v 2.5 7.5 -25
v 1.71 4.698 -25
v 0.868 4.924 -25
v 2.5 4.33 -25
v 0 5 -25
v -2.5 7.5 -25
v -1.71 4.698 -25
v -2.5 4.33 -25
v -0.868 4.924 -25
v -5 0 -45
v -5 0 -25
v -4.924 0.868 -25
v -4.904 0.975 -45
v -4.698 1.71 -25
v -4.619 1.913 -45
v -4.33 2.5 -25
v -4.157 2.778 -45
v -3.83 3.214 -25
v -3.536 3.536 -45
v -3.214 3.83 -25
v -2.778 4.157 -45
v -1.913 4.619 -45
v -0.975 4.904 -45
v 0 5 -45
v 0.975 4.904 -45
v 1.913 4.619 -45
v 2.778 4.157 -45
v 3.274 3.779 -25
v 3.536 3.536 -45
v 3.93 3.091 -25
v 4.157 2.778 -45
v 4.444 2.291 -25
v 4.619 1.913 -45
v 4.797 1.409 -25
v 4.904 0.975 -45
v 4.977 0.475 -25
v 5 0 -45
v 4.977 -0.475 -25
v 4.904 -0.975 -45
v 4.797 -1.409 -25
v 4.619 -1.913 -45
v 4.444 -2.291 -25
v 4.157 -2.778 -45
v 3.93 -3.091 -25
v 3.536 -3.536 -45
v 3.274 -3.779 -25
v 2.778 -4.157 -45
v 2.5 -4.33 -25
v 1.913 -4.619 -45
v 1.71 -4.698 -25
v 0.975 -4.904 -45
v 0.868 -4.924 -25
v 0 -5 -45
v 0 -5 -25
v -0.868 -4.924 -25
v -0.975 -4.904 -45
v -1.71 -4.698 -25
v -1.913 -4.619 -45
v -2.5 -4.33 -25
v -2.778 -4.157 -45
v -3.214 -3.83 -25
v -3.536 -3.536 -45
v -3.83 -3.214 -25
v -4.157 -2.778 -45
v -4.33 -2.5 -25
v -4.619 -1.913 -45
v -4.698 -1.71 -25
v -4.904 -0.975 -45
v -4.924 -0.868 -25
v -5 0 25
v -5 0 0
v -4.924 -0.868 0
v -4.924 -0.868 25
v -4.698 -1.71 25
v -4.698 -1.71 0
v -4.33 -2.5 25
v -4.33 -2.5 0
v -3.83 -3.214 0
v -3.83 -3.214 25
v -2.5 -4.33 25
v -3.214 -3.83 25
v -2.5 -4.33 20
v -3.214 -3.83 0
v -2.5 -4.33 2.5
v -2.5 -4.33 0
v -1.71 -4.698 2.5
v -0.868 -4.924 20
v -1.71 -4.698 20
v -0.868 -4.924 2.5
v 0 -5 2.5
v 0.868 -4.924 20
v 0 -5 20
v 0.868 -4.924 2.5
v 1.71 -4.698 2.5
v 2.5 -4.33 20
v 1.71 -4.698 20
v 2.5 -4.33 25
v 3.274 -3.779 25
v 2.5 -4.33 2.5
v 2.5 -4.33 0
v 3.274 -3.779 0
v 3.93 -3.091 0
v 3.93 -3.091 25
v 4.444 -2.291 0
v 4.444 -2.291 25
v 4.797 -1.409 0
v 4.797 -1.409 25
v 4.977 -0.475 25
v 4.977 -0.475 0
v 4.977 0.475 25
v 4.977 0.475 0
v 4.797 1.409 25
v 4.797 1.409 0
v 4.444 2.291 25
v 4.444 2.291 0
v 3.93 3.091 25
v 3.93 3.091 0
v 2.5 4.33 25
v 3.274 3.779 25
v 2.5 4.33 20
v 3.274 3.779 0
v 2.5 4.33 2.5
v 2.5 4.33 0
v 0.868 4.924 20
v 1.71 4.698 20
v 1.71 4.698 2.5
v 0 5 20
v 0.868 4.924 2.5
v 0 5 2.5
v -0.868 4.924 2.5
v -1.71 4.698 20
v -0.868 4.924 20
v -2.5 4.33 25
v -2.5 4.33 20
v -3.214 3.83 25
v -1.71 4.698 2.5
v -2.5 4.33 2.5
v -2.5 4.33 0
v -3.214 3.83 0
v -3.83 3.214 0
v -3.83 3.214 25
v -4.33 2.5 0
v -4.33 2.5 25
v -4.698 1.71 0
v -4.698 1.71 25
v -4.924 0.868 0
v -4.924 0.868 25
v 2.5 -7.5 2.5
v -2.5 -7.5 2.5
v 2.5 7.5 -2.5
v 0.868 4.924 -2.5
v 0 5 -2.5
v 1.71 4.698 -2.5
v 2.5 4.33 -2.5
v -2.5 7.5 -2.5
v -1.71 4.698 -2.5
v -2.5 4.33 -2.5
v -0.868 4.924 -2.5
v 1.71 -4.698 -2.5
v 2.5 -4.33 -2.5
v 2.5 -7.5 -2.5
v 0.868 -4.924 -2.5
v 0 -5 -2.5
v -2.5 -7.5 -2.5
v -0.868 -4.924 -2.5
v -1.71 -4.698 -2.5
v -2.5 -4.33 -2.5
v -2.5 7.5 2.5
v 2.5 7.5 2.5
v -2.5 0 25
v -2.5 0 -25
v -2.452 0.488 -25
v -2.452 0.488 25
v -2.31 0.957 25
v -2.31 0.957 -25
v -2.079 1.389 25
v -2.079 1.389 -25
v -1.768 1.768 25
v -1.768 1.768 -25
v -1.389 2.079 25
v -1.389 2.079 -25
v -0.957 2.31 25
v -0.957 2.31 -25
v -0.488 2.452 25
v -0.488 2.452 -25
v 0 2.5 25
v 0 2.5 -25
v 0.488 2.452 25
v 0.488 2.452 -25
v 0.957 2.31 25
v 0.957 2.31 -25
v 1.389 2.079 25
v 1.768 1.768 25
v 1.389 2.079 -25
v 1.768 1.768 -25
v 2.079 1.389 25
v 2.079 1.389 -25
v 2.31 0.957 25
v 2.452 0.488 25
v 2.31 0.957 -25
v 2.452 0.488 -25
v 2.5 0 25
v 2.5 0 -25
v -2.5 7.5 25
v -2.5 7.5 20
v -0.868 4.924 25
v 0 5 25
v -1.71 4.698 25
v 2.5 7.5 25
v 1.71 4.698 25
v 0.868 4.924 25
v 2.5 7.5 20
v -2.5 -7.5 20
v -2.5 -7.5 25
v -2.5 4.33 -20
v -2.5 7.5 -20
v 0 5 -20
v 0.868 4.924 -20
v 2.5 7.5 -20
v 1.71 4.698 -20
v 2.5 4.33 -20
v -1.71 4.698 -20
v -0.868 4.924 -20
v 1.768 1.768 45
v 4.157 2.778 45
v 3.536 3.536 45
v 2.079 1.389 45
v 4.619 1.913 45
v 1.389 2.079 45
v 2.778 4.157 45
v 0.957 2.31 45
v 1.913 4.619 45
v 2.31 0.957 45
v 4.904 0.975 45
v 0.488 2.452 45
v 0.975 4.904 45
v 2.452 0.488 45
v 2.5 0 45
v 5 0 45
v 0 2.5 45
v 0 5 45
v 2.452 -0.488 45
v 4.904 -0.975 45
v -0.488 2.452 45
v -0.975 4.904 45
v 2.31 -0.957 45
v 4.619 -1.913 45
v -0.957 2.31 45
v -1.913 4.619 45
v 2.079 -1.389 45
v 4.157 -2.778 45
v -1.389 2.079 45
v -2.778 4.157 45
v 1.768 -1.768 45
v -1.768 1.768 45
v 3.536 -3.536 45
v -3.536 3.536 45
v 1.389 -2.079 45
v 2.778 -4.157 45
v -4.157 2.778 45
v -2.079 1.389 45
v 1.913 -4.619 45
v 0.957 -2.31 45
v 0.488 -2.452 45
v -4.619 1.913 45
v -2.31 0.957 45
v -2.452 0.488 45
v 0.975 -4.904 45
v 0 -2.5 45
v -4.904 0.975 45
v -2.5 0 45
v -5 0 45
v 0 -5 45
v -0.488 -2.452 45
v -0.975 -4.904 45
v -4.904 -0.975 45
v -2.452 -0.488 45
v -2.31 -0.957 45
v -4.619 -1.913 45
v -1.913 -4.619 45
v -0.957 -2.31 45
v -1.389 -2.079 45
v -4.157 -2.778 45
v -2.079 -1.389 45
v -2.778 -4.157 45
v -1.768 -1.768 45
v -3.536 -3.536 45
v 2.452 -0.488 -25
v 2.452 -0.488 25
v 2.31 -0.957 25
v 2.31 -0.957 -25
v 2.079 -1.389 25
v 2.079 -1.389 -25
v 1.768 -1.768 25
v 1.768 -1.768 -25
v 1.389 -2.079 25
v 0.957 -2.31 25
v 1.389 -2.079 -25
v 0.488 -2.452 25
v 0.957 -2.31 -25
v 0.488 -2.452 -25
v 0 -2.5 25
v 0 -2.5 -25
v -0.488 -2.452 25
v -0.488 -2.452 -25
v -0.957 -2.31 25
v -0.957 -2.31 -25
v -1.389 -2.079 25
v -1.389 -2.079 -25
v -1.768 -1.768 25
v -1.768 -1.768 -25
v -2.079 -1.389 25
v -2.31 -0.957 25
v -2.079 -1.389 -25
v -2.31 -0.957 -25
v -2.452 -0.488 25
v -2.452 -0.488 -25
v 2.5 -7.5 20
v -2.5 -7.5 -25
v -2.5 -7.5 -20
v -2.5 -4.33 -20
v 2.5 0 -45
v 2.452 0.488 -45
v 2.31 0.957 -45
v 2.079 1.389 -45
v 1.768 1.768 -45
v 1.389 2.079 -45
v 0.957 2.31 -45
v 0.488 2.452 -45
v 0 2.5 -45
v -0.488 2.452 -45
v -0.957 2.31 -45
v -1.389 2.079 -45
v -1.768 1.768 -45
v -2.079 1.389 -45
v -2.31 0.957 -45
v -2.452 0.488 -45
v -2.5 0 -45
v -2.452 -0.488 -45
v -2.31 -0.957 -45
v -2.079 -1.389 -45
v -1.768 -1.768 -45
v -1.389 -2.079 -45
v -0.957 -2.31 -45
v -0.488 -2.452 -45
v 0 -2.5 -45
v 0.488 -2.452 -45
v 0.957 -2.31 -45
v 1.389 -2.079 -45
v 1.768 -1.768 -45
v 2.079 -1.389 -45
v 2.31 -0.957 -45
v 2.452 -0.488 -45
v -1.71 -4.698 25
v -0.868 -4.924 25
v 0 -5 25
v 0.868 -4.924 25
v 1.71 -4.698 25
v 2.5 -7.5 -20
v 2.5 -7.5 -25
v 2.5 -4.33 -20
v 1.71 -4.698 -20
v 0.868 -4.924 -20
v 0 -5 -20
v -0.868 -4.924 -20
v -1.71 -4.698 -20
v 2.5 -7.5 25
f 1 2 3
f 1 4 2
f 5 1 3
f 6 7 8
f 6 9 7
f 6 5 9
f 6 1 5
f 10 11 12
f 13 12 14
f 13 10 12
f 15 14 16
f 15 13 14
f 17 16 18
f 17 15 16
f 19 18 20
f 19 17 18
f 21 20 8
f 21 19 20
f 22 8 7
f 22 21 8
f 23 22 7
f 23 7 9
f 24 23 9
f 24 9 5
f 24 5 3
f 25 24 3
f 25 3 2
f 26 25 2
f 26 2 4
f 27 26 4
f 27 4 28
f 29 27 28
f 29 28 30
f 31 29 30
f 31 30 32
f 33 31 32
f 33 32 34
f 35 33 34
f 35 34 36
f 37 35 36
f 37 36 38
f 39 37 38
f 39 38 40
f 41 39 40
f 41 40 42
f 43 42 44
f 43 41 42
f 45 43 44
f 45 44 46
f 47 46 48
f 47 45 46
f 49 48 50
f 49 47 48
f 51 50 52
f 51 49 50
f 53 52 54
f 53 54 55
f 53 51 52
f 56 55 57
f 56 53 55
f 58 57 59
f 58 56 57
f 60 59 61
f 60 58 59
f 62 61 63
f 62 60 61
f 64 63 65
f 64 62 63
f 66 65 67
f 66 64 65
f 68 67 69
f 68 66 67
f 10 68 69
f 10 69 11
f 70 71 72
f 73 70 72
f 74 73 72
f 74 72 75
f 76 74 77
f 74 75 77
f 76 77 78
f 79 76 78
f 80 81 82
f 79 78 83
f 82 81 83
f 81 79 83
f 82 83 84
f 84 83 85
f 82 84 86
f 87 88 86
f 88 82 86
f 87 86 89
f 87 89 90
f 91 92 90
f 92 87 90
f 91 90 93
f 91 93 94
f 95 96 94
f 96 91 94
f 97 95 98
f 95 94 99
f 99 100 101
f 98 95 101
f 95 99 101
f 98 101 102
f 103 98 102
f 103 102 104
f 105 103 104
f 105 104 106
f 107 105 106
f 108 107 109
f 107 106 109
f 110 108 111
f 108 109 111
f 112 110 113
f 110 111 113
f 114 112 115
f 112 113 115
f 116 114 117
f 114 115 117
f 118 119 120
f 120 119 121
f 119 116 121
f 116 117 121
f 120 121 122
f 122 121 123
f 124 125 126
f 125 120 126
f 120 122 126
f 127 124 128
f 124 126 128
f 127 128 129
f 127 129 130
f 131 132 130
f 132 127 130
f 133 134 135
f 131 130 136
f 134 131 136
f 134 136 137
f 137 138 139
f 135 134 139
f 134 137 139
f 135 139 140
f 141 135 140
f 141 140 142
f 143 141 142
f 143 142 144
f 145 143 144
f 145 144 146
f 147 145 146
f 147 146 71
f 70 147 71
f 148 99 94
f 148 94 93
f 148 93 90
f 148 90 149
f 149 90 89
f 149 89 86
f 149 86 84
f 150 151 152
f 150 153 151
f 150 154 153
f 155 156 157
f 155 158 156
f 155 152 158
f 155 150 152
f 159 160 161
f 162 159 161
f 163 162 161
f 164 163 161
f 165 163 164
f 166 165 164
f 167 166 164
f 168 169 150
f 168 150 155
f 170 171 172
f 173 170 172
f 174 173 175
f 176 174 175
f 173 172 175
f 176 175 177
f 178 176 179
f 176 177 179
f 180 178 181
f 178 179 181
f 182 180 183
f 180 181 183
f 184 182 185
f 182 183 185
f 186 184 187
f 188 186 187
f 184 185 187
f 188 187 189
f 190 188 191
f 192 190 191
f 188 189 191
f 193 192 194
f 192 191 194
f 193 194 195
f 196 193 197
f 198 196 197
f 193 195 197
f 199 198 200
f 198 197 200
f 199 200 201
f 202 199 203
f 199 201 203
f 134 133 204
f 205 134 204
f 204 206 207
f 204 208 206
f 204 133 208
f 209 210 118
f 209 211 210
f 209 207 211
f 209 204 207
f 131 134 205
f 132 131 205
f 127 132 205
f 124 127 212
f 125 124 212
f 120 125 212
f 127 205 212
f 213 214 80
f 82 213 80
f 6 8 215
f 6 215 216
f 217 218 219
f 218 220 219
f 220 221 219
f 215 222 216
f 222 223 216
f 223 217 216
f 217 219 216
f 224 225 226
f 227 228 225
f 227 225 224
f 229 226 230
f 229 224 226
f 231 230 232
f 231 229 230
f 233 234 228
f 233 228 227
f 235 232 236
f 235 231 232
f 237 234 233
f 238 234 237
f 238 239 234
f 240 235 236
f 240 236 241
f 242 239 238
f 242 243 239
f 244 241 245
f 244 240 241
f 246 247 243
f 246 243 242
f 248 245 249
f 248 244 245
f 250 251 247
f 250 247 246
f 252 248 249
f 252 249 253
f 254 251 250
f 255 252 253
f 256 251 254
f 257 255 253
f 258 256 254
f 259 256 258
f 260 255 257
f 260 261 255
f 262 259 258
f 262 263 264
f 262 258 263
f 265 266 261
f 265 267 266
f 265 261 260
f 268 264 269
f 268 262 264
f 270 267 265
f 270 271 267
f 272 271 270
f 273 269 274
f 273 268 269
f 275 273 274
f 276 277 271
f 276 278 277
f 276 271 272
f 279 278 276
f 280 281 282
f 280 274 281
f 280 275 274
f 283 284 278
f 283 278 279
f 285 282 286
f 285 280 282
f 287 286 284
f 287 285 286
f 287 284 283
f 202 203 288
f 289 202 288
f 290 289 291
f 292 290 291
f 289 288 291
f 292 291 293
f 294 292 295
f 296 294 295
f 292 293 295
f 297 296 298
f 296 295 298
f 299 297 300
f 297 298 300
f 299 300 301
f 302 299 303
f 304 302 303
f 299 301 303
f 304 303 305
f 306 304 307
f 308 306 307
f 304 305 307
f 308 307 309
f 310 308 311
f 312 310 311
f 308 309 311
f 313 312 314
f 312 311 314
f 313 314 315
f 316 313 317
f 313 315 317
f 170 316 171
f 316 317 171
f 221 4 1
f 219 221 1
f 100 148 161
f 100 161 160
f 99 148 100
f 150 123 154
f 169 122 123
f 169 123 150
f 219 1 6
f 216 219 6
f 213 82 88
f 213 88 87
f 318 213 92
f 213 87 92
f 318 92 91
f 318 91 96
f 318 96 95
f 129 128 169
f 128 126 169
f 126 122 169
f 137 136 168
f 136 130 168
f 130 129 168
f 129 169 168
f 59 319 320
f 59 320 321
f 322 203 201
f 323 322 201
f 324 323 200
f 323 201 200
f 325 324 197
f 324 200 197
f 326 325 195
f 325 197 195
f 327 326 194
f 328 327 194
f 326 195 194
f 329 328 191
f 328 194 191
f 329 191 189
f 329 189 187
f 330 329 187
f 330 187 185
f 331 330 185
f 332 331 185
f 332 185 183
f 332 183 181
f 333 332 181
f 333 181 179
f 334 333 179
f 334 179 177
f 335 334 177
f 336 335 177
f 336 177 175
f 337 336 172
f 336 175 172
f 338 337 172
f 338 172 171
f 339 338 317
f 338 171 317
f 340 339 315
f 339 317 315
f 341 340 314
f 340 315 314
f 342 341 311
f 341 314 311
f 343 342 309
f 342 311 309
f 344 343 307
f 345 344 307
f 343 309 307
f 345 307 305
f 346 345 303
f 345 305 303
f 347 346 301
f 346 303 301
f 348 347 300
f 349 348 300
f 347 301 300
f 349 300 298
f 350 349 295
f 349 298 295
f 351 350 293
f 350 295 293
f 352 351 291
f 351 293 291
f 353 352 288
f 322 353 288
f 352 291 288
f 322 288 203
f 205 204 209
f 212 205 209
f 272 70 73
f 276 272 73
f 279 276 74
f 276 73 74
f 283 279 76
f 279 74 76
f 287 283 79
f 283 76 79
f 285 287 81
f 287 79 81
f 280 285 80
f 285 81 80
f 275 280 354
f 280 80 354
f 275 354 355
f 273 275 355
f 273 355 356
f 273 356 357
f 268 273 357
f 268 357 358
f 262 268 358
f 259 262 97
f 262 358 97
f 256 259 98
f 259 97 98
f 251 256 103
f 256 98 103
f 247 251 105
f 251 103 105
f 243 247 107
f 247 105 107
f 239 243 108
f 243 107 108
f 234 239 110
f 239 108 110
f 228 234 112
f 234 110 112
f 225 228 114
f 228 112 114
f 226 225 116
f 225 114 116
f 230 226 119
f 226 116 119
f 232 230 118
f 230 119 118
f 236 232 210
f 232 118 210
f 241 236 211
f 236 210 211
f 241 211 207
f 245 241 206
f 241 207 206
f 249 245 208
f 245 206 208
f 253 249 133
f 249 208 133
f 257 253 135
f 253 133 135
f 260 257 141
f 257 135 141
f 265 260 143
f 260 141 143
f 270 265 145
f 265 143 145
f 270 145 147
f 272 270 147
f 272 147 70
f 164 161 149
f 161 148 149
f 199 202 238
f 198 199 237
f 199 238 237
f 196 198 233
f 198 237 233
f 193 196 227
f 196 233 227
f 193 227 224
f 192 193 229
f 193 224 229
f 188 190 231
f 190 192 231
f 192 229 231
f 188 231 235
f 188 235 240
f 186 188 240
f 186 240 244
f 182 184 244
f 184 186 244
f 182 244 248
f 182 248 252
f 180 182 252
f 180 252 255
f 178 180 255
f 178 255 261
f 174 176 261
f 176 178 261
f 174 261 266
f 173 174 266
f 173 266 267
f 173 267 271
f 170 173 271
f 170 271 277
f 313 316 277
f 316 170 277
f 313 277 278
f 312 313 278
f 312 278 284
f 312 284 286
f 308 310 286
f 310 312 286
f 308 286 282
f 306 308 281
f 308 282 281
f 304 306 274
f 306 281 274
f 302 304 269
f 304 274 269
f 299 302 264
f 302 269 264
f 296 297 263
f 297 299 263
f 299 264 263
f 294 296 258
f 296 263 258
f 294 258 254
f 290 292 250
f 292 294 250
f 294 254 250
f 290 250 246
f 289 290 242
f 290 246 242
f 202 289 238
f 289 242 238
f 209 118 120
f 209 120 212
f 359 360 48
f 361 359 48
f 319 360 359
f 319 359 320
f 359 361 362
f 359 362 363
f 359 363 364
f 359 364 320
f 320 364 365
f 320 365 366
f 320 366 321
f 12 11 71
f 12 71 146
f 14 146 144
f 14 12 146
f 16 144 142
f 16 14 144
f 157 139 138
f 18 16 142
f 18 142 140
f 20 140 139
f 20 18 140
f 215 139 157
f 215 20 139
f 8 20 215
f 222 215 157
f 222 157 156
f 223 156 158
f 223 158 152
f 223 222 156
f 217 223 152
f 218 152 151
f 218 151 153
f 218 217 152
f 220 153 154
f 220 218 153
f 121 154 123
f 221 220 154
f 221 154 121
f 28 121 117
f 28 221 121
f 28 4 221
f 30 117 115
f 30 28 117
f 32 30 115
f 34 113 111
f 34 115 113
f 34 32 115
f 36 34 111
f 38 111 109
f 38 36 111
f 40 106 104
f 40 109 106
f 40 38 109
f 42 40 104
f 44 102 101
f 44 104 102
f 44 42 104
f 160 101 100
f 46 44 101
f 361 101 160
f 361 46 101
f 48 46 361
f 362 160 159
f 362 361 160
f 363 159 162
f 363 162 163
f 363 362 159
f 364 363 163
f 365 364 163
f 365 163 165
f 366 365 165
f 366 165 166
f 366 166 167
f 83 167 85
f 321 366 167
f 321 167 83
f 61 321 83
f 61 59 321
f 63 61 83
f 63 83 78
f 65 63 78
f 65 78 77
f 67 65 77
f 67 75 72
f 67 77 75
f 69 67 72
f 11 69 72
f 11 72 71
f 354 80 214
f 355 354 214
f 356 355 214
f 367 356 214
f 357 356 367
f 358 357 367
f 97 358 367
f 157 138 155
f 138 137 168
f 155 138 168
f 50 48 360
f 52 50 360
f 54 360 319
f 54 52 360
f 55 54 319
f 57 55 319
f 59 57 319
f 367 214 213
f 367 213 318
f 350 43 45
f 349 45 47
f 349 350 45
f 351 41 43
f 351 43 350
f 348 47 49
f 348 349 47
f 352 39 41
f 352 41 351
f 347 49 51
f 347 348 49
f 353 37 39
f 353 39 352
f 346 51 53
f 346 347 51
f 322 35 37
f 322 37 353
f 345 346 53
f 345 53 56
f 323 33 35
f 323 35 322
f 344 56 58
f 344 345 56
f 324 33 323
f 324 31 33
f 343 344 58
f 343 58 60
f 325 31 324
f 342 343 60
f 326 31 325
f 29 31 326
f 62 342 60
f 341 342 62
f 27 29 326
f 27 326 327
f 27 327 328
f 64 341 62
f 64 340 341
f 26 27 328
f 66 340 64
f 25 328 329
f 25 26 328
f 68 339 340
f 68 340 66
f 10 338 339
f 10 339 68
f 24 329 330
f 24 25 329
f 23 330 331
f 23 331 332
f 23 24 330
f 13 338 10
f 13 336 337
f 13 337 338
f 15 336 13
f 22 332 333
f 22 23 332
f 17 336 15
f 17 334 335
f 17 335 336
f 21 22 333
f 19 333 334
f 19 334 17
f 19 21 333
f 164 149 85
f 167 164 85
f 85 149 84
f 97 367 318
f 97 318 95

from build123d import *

# Parameters (mm, degrees)
SKETCH1_R             = 5
BOSS_EXTRUDE1_DEPTH   = 25
SKETCH2_W             = 5
SKETCH2_H             = 15
BOSS_EXTRUDE2_DEPTH   = 5
SKETCH3_W             = 5
SKETCH3_H             = 15
BOSS_EXTRUDE3_DEPTH   = 2.5
SKETCH5_W             = 5
SKETCH5_H             = 15
BOSS_EXTRUDE5_DEPTH   = 2.5
BOSS_EXTRUDE6_START   = 25
SKETCH6_R             = 5
BOSS_EXTRUDE6_DEPTH   = 25
SKETCH7_W             = 5
SKETCH7_H             = 15
BOSS_EXTRUDE7_DEPTH   = 5
F_5_0MM_DOWEL_HOLE1_D = 5
BOSS_EXTRUDE8_START   = 20
SKETCH14_R            = 5
BOSS_EXTRUDE8_DEPTH   = 20
SKETCH15_R            = 5
BOSS_EXTRUDE9_DEPTH   = 20
F_5_0MM_DOWEL_HOLE2_D = 5


with BuildPart() as part:
    # Sketch1 → Boss-Extrude1 (new body)
    with BuildSketch(Plane.XY):
        with Locations(Location((0, 0, 0), (0, 0, 180))):
            Circle(SKETCH1_R)
    extrude(amount=BOSS_EXTRUDE1_DEPTH)

    # Sketch2 → Boss-Extrude2 (add)
    with BuildSketch(Plane.XY.offset(25)):
        Rectangle(SKETCH2_W, SKETCH2_H)
    extrude(amount=-BOSS_EXTRUDE2_DEPTH)

    # Sketch3 → Boss-Extrude3 (add)
    with BuildSketch(Plane(origin=(0, 0, 0), x_dir=(-1, 0, 0), z_dir=(0, 0, -1))):
        Rectangle(SKETCH3_W, SKETCH3_H)
    extrude(amount=-BOSS_EXTRUDE3_DEPTH)

    # Sketch5 → Boss-Extrude5 (add)
    with BuildSketch(Plane(origin=(0, 0, 0), x_dir=(-1, 0, 0), z_dir=(0, 0, -1))):
        Rectangle(SKETCH5_W, SKETCH5_H)
    extrude(amount=BOSS_EXTRUDE5_DEPTH)

    # Sketch6 → Boss-Extrude6 (add)
    with BuildSketch(Plane(origin=(0, 0, 0), x_dir=(-1, 0, 0), z_dir=(0, 0, -1)).offset(BOSS_EXTRUDE6_START)):
        Circle(SKETCH6_R)
    extrude(amount=-BOSS_EXTRUDE6_DEPTH)

    # Sketch7 → Boss-Extrude7 (add)
    with BuildSketch(Plane(origin=(0, 0, -25), x_dir=(-1, 0, 0), z_dir=(0, 0, -1))):
        Rectangle(SKETCH7_W, SKETCH7_H)
    extrude(amount=-BOSS_EXTRUDE7_DEPTH)

    # Ø5.0mm Dowel Hole1 (through all)
    with Locations(Plane.XY.offset(25)):
        with Locations((0, 0)):
            Hole(F_5_0MM_DOWEL_HOLE1_D / 2)

    # Sketch14 → Boss-Extrude8 (add)
    with BuildSketch(Plane(origin=(0, 0, -25), x_dir=(-1, 0, 0), z_dir=(0, 0, -1)).offset(BOSS_EXTRUDE8_START)):
        Circle(SKETCH14_R)
    extrude(amount=-BOSS_EXTRUDE8_DEPTH)

    # Sketch15 → Boss-Extrude9 (add)
    with BuildSketch(Plane.XY.offset(25)):
        with Locations(Location((0, 0, 0), (0, 0, 180))):
            Circle(SKETCH15_R)
    extrude(amount=BOSS_EXTRUDE9_DEPTH)

    # Ø5.0mm Dowel Hole2 (through all)
    with Locations(Plane(origin=(0, 0, -45), x_dir=(-1, 0, 0), z_dir=(0, 0, -1))):
        with Locations((0, 0)):
            Hole(F_5_0MM_DOWEL_HOLE2_D / 2)


solid = part.part
